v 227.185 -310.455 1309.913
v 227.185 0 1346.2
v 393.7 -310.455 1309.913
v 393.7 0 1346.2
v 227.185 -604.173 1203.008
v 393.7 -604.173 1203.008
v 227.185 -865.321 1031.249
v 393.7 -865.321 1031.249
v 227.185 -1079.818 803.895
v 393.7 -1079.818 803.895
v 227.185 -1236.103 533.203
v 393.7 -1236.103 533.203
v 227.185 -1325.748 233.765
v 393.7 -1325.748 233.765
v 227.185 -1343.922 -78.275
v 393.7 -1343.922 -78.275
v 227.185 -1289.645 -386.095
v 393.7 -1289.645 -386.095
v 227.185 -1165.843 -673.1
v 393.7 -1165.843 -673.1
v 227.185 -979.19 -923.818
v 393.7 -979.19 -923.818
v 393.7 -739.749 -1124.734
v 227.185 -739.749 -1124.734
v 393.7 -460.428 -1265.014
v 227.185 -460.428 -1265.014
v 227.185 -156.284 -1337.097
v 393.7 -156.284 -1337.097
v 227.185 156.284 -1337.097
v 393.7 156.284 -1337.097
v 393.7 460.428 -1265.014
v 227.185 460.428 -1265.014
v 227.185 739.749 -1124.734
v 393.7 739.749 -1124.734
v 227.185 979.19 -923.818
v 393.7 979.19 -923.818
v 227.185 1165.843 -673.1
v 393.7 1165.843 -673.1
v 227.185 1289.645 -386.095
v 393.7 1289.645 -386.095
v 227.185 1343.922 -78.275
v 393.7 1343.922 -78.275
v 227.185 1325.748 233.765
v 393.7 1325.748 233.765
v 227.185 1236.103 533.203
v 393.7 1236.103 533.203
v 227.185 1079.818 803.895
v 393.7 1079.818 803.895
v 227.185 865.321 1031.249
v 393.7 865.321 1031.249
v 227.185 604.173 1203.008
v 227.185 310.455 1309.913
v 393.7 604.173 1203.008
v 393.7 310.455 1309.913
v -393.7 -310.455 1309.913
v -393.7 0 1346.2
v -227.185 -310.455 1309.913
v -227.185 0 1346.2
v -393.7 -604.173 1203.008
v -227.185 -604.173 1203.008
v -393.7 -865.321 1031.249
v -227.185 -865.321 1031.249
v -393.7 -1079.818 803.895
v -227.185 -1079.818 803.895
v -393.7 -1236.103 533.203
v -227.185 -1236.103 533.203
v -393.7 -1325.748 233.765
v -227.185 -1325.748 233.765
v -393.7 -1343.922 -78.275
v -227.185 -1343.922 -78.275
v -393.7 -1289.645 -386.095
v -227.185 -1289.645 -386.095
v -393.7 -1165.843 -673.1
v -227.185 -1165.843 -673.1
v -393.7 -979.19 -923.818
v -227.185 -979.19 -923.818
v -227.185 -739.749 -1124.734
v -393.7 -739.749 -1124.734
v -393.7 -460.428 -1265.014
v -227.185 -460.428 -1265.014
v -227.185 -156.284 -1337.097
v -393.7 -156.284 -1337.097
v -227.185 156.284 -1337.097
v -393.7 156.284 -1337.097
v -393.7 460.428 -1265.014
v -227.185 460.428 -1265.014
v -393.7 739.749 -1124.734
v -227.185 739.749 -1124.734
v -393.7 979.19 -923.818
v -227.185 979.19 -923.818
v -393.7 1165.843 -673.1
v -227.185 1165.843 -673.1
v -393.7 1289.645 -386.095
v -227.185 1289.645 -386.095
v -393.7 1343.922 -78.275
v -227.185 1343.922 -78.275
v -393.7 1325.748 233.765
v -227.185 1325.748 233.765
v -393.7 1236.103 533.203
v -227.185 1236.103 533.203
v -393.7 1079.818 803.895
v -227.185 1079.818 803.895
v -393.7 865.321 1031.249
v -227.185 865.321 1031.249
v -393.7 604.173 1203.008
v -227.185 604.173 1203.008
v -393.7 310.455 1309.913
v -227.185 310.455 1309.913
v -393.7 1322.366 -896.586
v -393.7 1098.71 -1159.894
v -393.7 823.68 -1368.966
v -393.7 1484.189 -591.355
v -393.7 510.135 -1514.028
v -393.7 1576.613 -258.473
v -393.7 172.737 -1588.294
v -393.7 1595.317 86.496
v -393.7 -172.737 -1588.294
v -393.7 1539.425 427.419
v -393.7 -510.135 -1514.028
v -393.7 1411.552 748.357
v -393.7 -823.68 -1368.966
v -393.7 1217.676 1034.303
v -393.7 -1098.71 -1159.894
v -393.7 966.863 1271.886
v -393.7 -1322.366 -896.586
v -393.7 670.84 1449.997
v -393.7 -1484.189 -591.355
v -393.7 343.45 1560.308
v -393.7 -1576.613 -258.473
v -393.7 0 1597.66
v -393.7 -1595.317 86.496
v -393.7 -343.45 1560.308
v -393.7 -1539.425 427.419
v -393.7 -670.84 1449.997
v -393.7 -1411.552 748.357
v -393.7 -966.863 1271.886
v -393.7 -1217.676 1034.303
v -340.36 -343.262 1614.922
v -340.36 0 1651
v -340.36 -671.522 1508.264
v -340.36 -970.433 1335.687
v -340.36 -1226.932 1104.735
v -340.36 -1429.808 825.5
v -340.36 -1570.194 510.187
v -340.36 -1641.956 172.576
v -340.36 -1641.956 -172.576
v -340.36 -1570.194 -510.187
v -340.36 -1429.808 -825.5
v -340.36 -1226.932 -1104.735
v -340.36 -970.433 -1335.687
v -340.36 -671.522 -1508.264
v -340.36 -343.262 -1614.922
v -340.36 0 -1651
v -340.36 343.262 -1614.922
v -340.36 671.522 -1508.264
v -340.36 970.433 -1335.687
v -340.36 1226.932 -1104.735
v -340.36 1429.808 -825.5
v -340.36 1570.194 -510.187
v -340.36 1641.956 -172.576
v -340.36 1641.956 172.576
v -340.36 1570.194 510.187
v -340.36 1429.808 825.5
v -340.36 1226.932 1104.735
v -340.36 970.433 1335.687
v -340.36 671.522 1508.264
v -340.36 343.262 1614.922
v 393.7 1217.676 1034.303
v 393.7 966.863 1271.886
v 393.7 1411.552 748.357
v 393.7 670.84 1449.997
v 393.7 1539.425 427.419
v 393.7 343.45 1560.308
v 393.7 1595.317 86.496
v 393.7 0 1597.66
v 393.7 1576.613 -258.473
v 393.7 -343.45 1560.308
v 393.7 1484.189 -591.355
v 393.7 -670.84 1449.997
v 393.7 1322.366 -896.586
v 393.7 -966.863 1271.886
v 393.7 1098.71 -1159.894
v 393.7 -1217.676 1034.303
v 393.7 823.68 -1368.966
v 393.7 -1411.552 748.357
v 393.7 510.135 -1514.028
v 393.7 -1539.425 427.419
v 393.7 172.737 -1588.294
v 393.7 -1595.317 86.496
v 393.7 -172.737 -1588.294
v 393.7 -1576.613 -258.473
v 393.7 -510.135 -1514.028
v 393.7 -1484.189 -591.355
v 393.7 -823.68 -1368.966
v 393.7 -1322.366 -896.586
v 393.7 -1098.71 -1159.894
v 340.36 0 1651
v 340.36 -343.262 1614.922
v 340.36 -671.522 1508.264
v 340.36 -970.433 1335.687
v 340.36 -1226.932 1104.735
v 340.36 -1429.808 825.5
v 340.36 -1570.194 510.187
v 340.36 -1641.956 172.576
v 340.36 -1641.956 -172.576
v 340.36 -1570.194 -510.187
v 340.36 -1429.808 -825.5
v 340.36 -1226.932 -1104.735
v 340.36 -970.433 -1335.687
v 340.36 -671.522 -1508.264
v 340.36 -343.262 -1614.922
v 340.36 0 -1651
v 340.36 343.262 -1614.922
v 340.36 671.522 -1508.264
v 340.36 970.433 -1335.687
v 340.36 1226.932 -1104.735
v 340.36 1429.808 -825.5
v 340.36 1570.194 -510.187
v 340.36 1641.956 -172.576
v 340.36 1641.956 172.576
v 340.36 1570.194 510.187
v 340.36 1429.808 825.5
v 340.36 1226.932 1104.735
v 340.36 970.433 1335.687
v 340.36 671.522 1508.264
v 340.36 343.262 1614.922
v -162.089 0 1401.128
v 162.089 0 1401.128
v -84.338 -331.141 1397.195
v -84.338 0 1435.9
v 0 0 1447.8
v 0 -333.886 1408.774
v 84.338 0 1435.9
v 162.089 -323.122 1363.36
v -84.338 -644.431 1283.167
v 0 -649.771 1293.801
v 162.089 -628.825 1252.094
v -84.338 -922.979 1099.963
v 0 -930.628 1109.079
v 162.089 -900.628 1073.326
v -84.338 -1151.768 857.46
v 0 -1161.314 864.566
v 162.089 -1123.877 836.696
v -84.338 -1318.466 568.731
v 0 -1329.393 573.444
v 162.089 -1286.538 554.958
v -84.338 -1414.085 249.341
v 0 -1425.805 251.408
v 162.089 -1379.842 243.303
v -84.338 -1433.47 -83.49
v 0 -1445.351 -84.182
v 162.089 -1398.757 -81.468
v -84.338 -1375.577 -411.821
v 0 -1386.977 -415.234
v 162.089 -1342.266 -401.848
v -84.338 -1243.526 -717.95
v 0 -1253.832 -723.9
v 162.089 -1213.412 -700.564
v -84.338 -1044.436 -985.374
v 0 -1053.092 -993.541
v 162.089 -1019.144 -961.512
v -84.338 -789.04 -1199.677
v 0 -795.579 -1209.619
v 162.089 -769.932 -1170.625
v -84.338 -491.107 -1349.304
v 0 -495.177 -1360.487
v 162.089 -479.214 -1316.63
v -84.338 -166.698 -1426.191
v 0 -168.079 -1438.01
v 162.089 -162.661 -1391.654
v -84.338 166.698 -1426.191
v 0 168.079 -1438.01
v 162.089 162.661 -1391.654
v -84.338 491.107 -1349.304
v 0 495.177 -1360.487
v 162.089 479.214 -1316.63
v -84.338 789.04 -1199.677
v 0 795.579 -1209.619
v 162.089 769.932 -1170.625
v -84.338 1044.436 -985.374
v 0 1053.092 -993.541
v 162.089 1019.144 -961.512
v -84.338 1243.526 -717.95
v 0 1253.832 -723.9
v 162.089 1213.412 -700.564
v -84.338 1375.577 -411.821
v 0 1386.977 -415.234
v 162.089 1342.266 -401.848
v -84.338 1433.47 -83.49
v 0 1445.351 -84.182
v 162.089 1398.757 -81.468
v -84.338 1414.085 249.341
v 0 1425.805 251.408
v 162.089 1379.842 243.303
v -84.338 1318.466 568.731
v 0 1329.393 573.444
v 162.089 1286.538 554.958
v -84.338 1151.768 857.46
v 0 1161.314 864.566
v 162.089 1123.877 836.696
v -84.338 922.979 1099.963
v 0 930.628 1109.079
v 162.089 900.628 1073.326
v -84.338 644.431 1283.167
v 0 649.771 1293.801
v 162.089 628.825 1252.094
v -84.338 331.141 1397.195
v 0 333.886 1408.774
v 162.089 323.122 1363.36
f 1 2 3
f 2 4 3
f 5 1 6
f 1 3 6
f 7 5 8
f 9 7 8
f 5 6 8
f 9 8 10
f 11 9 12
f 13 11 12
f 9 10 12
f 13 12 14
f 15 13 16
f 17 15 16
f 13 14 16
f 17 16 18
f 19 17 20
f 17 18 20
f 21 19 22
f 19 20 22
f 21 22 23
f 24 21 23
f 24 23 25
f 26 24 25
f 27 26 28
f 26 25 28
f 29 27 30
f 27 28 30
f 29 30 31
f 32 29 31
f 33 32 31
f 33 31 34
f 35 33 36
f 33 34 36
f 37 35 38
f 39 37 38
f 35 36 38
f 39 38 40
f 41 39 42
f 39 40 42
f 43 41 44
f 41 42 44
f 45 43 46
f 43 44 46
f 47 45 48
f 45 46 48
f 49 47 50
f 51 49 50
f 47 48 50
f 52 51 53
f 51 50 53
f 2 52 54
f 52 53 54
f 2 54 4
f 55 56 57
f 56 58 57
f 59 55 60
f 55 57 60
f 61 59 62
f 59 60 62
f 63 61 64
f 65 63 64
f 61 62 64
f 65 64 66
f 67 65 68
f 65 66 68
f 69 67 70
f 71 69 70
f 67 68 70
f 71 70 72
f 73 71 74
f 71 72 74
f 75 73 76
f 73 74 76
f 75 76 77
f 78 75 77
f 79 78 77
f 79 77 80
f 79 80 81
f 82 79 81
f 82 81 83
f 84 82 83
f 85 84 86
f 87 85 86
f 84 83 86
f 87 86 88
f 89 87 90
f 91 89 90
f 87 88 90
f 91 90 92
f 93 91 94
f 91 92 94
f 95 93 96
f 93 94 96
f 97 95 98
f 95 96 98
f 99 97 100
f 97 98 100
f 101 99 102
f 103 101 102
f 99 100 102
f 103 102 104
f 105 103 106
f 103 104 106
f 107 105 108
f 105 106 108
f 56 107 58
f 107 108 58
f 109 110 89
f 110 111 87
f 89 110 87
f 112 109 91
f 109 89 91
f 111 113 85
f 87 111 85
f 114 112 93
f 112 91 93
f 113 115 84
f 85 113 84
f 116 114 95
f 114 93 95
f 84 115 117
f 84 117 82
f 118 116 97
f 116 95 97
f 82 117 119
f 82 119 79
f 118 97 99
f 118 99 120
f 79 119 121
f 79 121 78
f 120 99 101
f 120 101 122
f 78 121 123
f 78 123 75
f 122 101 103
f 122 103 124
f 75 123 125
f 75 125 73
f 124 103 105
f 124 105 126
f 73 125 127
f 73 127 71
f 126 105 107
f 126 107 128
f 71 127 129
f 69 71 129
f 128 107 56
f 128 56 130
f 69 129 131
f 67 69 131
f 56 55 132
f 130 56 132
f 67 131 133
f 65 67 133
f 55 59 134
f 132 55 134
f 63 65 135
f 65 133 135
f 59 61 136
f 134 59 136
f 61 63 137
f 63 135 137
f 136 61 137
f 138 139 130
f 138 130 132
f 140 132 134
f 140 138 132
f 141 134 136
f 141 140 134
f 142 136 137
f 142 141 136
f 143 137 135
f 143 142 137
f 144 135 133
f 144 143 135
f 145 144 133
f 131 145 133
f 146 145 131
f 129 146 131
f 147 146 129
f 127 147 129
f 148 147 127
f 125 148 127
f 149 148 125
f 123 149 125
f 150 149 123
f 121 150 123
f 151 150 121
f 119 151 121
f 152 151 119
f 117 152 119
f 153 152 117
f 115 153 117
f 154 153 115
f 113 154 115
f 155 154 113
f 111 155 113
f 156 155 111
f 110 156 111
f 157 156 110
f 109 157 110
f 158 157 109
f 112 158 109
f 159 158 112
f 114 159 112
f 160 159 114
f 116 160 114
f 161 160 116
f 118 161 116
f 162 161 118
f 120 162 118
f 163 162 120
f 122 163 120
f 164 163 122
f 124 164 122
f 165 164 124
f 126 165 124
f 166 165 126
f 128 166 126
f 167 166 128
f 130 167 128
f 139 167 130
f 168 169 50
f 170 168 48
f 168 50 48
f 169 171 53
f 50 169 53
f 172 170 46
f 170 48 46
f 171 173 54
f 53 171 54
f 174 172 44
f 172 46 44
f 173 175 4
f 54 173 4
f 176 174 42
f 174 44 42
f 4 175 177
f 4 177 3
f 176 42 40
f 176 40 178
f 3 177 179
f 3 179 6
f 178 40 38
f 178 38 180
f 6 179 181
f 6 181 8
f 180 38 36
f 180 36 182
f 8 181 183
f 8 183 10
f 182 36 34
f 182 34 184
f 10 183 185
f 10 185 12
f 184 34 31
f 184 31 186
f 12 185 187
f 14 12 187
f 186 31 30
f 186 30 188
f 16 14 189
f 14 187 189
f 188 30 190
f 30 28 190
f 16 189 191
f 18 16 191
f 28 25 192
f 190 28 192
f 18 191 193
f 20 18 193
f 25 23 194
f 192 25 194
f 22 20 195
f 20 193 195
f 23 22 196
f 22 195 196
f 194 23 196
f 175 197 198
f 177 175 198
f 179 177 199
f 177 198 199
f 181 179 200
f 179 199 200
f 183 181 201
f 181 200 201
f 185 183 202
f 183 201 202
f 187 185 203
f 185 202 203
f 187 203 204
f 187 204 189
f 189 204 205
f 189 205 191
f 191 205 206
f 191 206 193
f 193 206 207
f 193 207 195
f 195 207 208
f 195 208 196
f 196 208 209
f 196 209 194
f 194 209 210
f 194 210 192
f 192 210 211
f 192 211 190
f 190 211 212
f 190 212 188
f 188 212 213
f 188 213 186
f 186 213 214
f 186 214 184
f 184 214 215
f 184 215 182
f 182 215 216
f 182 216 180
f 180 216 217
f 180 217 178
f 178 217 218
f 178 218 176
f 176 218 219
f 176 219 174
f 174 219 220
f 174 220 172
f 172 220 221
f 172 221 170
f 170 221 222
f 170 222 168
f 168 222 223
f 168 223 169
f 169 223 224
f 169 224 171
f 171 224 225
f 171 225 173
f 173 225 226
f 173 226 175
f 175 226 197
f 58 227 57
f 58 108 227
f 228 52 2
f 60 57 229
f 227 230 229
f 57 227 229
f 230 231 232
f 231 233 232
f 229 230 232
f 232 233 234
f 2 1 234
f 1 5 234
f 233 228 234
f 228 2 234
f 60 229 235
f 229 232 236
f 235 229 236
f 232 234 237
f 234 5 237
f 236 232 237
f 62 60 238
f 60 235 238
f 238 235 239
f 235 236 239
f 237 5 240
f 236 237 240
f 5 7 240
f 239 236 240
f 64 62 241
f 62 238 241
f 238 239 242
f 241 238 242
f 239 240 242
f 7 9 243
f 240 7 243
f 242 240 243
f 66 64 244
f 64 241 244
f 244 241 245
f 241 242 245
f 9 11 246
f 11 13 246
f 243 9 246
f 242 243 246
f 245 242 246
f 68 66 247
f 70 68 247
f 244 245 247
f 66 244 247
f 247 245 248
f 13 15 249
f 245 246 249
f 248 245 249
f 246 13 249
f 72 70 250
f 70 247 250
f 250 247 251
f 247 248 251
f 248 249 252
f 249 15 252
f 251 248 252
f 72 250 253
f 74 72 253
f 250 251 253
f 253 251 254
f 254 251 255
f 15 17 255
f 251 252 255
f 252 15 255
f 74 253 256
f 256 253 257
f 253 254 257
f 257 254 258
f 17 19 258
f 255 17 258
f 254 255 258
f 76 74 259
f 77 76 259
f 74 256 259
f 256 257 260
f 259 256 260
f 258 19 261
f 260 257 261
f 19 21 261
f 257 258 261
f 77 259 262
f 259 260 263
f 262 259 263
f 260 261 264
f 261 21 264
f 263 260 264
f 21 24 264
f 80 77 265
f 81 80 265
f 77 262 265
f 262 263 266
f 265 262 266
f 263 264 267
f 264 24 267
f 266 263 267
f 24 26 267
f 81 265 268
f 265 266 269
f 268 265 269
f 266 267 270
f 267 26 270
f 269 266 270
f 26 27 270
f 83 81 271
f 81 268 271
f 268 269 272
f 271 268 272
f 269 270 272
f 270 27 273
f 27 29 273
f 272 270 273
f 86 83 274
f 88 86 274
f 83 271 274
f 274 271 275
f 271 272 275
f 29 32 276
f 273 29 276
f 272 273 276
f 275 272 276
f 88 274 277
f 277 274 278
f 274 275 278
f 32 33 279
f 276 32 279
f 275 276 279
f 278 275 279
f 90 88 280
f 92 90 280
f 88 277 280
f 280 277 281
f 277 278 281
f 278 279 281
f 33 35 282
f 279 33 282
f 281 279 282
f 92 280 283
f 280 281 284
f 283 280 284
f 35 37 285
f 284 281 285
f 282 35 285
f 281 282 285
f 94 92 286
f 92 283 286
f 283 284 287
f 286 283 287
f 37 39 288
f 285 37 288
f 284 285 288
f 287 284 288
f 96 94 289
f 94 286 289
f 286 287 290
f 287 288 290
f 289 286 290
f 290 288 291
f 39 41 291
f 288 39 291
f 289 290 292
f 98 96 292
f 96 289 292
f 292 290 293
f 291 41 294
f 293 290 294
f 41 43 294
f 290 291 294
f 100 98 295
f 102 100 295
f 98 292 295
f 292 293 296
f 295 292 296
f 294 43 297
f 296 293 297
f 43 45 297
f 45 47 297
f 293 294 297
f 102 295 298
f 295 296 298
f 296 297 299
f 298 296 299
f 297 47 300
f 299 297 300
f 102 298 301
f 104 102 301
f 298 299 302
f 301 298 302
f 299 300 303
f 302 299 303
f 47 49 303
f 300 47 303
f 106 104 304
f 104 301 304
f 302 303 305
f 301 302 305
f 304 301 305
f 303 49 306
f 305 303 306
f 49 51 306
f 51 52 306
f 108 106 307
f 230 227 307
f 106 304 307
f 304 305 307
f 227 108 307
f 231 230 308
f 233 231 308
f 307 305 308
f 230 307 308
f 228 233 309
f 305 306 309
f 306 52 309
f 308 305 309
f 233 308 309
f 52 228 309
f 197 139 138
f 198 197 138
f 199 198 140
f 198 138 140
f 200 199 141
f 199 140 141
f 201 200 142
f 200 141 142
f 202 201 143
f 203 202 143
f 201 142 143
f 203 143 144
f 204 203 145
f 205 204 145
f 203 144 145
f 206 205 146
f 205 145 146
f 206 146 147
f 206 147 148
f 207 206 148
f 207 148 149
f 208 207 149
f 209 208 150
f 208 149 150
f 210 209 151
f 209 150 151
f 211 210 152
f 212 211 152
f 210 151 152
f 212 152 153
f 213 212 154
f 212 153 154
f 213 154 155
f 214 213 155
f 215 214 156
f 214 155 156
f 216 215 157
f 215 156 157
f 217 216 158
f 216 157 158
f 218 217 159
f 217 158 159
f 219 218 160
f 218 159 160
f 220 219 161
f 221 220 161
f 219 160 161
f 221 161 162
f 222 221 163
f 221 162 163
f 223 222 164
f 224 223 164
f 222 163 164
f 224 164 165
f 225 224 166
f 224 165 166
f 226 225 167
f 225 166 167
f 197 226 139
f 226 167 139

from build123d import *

# Parameters (mm, degrees)
F2_SIZE = 53.34


with BuildPart() as f1:
    # F0 (on Front) → F1 (revolve)
    with BuildSketch(Plane.XZ):
        with BuildLine():
            Line((-393.7, 1651), (-393.7, 1346.2))
            Line((-393.7, 1346.2), (-227.184507, 1346.2))
            ThreePointArc((-227.184507, 1346.2), (0, 1447.8), (227.184507, 1346.2))
            Line((227.184507, 1346.2), (393.7, 1346.2))
            Line((393.7, 1346.2), (393.7, 1651))
            Line((393.7, 1651), (-393.7, 1651))
        make_face()
    revolve(axis=Axis((1351.211951, 0, 0), (1, 0, 0)))

    # F2
    f2_edges = [f1.edges().sort_by_distance(p)[0] for p in [
        (393.7, 0, -1651),
        (-393.7, 0, -1651),
        (0, 0, 1651),
    ]]
    chamfer(f2_edges, length=F2_SIZE)


solid = f1.part
